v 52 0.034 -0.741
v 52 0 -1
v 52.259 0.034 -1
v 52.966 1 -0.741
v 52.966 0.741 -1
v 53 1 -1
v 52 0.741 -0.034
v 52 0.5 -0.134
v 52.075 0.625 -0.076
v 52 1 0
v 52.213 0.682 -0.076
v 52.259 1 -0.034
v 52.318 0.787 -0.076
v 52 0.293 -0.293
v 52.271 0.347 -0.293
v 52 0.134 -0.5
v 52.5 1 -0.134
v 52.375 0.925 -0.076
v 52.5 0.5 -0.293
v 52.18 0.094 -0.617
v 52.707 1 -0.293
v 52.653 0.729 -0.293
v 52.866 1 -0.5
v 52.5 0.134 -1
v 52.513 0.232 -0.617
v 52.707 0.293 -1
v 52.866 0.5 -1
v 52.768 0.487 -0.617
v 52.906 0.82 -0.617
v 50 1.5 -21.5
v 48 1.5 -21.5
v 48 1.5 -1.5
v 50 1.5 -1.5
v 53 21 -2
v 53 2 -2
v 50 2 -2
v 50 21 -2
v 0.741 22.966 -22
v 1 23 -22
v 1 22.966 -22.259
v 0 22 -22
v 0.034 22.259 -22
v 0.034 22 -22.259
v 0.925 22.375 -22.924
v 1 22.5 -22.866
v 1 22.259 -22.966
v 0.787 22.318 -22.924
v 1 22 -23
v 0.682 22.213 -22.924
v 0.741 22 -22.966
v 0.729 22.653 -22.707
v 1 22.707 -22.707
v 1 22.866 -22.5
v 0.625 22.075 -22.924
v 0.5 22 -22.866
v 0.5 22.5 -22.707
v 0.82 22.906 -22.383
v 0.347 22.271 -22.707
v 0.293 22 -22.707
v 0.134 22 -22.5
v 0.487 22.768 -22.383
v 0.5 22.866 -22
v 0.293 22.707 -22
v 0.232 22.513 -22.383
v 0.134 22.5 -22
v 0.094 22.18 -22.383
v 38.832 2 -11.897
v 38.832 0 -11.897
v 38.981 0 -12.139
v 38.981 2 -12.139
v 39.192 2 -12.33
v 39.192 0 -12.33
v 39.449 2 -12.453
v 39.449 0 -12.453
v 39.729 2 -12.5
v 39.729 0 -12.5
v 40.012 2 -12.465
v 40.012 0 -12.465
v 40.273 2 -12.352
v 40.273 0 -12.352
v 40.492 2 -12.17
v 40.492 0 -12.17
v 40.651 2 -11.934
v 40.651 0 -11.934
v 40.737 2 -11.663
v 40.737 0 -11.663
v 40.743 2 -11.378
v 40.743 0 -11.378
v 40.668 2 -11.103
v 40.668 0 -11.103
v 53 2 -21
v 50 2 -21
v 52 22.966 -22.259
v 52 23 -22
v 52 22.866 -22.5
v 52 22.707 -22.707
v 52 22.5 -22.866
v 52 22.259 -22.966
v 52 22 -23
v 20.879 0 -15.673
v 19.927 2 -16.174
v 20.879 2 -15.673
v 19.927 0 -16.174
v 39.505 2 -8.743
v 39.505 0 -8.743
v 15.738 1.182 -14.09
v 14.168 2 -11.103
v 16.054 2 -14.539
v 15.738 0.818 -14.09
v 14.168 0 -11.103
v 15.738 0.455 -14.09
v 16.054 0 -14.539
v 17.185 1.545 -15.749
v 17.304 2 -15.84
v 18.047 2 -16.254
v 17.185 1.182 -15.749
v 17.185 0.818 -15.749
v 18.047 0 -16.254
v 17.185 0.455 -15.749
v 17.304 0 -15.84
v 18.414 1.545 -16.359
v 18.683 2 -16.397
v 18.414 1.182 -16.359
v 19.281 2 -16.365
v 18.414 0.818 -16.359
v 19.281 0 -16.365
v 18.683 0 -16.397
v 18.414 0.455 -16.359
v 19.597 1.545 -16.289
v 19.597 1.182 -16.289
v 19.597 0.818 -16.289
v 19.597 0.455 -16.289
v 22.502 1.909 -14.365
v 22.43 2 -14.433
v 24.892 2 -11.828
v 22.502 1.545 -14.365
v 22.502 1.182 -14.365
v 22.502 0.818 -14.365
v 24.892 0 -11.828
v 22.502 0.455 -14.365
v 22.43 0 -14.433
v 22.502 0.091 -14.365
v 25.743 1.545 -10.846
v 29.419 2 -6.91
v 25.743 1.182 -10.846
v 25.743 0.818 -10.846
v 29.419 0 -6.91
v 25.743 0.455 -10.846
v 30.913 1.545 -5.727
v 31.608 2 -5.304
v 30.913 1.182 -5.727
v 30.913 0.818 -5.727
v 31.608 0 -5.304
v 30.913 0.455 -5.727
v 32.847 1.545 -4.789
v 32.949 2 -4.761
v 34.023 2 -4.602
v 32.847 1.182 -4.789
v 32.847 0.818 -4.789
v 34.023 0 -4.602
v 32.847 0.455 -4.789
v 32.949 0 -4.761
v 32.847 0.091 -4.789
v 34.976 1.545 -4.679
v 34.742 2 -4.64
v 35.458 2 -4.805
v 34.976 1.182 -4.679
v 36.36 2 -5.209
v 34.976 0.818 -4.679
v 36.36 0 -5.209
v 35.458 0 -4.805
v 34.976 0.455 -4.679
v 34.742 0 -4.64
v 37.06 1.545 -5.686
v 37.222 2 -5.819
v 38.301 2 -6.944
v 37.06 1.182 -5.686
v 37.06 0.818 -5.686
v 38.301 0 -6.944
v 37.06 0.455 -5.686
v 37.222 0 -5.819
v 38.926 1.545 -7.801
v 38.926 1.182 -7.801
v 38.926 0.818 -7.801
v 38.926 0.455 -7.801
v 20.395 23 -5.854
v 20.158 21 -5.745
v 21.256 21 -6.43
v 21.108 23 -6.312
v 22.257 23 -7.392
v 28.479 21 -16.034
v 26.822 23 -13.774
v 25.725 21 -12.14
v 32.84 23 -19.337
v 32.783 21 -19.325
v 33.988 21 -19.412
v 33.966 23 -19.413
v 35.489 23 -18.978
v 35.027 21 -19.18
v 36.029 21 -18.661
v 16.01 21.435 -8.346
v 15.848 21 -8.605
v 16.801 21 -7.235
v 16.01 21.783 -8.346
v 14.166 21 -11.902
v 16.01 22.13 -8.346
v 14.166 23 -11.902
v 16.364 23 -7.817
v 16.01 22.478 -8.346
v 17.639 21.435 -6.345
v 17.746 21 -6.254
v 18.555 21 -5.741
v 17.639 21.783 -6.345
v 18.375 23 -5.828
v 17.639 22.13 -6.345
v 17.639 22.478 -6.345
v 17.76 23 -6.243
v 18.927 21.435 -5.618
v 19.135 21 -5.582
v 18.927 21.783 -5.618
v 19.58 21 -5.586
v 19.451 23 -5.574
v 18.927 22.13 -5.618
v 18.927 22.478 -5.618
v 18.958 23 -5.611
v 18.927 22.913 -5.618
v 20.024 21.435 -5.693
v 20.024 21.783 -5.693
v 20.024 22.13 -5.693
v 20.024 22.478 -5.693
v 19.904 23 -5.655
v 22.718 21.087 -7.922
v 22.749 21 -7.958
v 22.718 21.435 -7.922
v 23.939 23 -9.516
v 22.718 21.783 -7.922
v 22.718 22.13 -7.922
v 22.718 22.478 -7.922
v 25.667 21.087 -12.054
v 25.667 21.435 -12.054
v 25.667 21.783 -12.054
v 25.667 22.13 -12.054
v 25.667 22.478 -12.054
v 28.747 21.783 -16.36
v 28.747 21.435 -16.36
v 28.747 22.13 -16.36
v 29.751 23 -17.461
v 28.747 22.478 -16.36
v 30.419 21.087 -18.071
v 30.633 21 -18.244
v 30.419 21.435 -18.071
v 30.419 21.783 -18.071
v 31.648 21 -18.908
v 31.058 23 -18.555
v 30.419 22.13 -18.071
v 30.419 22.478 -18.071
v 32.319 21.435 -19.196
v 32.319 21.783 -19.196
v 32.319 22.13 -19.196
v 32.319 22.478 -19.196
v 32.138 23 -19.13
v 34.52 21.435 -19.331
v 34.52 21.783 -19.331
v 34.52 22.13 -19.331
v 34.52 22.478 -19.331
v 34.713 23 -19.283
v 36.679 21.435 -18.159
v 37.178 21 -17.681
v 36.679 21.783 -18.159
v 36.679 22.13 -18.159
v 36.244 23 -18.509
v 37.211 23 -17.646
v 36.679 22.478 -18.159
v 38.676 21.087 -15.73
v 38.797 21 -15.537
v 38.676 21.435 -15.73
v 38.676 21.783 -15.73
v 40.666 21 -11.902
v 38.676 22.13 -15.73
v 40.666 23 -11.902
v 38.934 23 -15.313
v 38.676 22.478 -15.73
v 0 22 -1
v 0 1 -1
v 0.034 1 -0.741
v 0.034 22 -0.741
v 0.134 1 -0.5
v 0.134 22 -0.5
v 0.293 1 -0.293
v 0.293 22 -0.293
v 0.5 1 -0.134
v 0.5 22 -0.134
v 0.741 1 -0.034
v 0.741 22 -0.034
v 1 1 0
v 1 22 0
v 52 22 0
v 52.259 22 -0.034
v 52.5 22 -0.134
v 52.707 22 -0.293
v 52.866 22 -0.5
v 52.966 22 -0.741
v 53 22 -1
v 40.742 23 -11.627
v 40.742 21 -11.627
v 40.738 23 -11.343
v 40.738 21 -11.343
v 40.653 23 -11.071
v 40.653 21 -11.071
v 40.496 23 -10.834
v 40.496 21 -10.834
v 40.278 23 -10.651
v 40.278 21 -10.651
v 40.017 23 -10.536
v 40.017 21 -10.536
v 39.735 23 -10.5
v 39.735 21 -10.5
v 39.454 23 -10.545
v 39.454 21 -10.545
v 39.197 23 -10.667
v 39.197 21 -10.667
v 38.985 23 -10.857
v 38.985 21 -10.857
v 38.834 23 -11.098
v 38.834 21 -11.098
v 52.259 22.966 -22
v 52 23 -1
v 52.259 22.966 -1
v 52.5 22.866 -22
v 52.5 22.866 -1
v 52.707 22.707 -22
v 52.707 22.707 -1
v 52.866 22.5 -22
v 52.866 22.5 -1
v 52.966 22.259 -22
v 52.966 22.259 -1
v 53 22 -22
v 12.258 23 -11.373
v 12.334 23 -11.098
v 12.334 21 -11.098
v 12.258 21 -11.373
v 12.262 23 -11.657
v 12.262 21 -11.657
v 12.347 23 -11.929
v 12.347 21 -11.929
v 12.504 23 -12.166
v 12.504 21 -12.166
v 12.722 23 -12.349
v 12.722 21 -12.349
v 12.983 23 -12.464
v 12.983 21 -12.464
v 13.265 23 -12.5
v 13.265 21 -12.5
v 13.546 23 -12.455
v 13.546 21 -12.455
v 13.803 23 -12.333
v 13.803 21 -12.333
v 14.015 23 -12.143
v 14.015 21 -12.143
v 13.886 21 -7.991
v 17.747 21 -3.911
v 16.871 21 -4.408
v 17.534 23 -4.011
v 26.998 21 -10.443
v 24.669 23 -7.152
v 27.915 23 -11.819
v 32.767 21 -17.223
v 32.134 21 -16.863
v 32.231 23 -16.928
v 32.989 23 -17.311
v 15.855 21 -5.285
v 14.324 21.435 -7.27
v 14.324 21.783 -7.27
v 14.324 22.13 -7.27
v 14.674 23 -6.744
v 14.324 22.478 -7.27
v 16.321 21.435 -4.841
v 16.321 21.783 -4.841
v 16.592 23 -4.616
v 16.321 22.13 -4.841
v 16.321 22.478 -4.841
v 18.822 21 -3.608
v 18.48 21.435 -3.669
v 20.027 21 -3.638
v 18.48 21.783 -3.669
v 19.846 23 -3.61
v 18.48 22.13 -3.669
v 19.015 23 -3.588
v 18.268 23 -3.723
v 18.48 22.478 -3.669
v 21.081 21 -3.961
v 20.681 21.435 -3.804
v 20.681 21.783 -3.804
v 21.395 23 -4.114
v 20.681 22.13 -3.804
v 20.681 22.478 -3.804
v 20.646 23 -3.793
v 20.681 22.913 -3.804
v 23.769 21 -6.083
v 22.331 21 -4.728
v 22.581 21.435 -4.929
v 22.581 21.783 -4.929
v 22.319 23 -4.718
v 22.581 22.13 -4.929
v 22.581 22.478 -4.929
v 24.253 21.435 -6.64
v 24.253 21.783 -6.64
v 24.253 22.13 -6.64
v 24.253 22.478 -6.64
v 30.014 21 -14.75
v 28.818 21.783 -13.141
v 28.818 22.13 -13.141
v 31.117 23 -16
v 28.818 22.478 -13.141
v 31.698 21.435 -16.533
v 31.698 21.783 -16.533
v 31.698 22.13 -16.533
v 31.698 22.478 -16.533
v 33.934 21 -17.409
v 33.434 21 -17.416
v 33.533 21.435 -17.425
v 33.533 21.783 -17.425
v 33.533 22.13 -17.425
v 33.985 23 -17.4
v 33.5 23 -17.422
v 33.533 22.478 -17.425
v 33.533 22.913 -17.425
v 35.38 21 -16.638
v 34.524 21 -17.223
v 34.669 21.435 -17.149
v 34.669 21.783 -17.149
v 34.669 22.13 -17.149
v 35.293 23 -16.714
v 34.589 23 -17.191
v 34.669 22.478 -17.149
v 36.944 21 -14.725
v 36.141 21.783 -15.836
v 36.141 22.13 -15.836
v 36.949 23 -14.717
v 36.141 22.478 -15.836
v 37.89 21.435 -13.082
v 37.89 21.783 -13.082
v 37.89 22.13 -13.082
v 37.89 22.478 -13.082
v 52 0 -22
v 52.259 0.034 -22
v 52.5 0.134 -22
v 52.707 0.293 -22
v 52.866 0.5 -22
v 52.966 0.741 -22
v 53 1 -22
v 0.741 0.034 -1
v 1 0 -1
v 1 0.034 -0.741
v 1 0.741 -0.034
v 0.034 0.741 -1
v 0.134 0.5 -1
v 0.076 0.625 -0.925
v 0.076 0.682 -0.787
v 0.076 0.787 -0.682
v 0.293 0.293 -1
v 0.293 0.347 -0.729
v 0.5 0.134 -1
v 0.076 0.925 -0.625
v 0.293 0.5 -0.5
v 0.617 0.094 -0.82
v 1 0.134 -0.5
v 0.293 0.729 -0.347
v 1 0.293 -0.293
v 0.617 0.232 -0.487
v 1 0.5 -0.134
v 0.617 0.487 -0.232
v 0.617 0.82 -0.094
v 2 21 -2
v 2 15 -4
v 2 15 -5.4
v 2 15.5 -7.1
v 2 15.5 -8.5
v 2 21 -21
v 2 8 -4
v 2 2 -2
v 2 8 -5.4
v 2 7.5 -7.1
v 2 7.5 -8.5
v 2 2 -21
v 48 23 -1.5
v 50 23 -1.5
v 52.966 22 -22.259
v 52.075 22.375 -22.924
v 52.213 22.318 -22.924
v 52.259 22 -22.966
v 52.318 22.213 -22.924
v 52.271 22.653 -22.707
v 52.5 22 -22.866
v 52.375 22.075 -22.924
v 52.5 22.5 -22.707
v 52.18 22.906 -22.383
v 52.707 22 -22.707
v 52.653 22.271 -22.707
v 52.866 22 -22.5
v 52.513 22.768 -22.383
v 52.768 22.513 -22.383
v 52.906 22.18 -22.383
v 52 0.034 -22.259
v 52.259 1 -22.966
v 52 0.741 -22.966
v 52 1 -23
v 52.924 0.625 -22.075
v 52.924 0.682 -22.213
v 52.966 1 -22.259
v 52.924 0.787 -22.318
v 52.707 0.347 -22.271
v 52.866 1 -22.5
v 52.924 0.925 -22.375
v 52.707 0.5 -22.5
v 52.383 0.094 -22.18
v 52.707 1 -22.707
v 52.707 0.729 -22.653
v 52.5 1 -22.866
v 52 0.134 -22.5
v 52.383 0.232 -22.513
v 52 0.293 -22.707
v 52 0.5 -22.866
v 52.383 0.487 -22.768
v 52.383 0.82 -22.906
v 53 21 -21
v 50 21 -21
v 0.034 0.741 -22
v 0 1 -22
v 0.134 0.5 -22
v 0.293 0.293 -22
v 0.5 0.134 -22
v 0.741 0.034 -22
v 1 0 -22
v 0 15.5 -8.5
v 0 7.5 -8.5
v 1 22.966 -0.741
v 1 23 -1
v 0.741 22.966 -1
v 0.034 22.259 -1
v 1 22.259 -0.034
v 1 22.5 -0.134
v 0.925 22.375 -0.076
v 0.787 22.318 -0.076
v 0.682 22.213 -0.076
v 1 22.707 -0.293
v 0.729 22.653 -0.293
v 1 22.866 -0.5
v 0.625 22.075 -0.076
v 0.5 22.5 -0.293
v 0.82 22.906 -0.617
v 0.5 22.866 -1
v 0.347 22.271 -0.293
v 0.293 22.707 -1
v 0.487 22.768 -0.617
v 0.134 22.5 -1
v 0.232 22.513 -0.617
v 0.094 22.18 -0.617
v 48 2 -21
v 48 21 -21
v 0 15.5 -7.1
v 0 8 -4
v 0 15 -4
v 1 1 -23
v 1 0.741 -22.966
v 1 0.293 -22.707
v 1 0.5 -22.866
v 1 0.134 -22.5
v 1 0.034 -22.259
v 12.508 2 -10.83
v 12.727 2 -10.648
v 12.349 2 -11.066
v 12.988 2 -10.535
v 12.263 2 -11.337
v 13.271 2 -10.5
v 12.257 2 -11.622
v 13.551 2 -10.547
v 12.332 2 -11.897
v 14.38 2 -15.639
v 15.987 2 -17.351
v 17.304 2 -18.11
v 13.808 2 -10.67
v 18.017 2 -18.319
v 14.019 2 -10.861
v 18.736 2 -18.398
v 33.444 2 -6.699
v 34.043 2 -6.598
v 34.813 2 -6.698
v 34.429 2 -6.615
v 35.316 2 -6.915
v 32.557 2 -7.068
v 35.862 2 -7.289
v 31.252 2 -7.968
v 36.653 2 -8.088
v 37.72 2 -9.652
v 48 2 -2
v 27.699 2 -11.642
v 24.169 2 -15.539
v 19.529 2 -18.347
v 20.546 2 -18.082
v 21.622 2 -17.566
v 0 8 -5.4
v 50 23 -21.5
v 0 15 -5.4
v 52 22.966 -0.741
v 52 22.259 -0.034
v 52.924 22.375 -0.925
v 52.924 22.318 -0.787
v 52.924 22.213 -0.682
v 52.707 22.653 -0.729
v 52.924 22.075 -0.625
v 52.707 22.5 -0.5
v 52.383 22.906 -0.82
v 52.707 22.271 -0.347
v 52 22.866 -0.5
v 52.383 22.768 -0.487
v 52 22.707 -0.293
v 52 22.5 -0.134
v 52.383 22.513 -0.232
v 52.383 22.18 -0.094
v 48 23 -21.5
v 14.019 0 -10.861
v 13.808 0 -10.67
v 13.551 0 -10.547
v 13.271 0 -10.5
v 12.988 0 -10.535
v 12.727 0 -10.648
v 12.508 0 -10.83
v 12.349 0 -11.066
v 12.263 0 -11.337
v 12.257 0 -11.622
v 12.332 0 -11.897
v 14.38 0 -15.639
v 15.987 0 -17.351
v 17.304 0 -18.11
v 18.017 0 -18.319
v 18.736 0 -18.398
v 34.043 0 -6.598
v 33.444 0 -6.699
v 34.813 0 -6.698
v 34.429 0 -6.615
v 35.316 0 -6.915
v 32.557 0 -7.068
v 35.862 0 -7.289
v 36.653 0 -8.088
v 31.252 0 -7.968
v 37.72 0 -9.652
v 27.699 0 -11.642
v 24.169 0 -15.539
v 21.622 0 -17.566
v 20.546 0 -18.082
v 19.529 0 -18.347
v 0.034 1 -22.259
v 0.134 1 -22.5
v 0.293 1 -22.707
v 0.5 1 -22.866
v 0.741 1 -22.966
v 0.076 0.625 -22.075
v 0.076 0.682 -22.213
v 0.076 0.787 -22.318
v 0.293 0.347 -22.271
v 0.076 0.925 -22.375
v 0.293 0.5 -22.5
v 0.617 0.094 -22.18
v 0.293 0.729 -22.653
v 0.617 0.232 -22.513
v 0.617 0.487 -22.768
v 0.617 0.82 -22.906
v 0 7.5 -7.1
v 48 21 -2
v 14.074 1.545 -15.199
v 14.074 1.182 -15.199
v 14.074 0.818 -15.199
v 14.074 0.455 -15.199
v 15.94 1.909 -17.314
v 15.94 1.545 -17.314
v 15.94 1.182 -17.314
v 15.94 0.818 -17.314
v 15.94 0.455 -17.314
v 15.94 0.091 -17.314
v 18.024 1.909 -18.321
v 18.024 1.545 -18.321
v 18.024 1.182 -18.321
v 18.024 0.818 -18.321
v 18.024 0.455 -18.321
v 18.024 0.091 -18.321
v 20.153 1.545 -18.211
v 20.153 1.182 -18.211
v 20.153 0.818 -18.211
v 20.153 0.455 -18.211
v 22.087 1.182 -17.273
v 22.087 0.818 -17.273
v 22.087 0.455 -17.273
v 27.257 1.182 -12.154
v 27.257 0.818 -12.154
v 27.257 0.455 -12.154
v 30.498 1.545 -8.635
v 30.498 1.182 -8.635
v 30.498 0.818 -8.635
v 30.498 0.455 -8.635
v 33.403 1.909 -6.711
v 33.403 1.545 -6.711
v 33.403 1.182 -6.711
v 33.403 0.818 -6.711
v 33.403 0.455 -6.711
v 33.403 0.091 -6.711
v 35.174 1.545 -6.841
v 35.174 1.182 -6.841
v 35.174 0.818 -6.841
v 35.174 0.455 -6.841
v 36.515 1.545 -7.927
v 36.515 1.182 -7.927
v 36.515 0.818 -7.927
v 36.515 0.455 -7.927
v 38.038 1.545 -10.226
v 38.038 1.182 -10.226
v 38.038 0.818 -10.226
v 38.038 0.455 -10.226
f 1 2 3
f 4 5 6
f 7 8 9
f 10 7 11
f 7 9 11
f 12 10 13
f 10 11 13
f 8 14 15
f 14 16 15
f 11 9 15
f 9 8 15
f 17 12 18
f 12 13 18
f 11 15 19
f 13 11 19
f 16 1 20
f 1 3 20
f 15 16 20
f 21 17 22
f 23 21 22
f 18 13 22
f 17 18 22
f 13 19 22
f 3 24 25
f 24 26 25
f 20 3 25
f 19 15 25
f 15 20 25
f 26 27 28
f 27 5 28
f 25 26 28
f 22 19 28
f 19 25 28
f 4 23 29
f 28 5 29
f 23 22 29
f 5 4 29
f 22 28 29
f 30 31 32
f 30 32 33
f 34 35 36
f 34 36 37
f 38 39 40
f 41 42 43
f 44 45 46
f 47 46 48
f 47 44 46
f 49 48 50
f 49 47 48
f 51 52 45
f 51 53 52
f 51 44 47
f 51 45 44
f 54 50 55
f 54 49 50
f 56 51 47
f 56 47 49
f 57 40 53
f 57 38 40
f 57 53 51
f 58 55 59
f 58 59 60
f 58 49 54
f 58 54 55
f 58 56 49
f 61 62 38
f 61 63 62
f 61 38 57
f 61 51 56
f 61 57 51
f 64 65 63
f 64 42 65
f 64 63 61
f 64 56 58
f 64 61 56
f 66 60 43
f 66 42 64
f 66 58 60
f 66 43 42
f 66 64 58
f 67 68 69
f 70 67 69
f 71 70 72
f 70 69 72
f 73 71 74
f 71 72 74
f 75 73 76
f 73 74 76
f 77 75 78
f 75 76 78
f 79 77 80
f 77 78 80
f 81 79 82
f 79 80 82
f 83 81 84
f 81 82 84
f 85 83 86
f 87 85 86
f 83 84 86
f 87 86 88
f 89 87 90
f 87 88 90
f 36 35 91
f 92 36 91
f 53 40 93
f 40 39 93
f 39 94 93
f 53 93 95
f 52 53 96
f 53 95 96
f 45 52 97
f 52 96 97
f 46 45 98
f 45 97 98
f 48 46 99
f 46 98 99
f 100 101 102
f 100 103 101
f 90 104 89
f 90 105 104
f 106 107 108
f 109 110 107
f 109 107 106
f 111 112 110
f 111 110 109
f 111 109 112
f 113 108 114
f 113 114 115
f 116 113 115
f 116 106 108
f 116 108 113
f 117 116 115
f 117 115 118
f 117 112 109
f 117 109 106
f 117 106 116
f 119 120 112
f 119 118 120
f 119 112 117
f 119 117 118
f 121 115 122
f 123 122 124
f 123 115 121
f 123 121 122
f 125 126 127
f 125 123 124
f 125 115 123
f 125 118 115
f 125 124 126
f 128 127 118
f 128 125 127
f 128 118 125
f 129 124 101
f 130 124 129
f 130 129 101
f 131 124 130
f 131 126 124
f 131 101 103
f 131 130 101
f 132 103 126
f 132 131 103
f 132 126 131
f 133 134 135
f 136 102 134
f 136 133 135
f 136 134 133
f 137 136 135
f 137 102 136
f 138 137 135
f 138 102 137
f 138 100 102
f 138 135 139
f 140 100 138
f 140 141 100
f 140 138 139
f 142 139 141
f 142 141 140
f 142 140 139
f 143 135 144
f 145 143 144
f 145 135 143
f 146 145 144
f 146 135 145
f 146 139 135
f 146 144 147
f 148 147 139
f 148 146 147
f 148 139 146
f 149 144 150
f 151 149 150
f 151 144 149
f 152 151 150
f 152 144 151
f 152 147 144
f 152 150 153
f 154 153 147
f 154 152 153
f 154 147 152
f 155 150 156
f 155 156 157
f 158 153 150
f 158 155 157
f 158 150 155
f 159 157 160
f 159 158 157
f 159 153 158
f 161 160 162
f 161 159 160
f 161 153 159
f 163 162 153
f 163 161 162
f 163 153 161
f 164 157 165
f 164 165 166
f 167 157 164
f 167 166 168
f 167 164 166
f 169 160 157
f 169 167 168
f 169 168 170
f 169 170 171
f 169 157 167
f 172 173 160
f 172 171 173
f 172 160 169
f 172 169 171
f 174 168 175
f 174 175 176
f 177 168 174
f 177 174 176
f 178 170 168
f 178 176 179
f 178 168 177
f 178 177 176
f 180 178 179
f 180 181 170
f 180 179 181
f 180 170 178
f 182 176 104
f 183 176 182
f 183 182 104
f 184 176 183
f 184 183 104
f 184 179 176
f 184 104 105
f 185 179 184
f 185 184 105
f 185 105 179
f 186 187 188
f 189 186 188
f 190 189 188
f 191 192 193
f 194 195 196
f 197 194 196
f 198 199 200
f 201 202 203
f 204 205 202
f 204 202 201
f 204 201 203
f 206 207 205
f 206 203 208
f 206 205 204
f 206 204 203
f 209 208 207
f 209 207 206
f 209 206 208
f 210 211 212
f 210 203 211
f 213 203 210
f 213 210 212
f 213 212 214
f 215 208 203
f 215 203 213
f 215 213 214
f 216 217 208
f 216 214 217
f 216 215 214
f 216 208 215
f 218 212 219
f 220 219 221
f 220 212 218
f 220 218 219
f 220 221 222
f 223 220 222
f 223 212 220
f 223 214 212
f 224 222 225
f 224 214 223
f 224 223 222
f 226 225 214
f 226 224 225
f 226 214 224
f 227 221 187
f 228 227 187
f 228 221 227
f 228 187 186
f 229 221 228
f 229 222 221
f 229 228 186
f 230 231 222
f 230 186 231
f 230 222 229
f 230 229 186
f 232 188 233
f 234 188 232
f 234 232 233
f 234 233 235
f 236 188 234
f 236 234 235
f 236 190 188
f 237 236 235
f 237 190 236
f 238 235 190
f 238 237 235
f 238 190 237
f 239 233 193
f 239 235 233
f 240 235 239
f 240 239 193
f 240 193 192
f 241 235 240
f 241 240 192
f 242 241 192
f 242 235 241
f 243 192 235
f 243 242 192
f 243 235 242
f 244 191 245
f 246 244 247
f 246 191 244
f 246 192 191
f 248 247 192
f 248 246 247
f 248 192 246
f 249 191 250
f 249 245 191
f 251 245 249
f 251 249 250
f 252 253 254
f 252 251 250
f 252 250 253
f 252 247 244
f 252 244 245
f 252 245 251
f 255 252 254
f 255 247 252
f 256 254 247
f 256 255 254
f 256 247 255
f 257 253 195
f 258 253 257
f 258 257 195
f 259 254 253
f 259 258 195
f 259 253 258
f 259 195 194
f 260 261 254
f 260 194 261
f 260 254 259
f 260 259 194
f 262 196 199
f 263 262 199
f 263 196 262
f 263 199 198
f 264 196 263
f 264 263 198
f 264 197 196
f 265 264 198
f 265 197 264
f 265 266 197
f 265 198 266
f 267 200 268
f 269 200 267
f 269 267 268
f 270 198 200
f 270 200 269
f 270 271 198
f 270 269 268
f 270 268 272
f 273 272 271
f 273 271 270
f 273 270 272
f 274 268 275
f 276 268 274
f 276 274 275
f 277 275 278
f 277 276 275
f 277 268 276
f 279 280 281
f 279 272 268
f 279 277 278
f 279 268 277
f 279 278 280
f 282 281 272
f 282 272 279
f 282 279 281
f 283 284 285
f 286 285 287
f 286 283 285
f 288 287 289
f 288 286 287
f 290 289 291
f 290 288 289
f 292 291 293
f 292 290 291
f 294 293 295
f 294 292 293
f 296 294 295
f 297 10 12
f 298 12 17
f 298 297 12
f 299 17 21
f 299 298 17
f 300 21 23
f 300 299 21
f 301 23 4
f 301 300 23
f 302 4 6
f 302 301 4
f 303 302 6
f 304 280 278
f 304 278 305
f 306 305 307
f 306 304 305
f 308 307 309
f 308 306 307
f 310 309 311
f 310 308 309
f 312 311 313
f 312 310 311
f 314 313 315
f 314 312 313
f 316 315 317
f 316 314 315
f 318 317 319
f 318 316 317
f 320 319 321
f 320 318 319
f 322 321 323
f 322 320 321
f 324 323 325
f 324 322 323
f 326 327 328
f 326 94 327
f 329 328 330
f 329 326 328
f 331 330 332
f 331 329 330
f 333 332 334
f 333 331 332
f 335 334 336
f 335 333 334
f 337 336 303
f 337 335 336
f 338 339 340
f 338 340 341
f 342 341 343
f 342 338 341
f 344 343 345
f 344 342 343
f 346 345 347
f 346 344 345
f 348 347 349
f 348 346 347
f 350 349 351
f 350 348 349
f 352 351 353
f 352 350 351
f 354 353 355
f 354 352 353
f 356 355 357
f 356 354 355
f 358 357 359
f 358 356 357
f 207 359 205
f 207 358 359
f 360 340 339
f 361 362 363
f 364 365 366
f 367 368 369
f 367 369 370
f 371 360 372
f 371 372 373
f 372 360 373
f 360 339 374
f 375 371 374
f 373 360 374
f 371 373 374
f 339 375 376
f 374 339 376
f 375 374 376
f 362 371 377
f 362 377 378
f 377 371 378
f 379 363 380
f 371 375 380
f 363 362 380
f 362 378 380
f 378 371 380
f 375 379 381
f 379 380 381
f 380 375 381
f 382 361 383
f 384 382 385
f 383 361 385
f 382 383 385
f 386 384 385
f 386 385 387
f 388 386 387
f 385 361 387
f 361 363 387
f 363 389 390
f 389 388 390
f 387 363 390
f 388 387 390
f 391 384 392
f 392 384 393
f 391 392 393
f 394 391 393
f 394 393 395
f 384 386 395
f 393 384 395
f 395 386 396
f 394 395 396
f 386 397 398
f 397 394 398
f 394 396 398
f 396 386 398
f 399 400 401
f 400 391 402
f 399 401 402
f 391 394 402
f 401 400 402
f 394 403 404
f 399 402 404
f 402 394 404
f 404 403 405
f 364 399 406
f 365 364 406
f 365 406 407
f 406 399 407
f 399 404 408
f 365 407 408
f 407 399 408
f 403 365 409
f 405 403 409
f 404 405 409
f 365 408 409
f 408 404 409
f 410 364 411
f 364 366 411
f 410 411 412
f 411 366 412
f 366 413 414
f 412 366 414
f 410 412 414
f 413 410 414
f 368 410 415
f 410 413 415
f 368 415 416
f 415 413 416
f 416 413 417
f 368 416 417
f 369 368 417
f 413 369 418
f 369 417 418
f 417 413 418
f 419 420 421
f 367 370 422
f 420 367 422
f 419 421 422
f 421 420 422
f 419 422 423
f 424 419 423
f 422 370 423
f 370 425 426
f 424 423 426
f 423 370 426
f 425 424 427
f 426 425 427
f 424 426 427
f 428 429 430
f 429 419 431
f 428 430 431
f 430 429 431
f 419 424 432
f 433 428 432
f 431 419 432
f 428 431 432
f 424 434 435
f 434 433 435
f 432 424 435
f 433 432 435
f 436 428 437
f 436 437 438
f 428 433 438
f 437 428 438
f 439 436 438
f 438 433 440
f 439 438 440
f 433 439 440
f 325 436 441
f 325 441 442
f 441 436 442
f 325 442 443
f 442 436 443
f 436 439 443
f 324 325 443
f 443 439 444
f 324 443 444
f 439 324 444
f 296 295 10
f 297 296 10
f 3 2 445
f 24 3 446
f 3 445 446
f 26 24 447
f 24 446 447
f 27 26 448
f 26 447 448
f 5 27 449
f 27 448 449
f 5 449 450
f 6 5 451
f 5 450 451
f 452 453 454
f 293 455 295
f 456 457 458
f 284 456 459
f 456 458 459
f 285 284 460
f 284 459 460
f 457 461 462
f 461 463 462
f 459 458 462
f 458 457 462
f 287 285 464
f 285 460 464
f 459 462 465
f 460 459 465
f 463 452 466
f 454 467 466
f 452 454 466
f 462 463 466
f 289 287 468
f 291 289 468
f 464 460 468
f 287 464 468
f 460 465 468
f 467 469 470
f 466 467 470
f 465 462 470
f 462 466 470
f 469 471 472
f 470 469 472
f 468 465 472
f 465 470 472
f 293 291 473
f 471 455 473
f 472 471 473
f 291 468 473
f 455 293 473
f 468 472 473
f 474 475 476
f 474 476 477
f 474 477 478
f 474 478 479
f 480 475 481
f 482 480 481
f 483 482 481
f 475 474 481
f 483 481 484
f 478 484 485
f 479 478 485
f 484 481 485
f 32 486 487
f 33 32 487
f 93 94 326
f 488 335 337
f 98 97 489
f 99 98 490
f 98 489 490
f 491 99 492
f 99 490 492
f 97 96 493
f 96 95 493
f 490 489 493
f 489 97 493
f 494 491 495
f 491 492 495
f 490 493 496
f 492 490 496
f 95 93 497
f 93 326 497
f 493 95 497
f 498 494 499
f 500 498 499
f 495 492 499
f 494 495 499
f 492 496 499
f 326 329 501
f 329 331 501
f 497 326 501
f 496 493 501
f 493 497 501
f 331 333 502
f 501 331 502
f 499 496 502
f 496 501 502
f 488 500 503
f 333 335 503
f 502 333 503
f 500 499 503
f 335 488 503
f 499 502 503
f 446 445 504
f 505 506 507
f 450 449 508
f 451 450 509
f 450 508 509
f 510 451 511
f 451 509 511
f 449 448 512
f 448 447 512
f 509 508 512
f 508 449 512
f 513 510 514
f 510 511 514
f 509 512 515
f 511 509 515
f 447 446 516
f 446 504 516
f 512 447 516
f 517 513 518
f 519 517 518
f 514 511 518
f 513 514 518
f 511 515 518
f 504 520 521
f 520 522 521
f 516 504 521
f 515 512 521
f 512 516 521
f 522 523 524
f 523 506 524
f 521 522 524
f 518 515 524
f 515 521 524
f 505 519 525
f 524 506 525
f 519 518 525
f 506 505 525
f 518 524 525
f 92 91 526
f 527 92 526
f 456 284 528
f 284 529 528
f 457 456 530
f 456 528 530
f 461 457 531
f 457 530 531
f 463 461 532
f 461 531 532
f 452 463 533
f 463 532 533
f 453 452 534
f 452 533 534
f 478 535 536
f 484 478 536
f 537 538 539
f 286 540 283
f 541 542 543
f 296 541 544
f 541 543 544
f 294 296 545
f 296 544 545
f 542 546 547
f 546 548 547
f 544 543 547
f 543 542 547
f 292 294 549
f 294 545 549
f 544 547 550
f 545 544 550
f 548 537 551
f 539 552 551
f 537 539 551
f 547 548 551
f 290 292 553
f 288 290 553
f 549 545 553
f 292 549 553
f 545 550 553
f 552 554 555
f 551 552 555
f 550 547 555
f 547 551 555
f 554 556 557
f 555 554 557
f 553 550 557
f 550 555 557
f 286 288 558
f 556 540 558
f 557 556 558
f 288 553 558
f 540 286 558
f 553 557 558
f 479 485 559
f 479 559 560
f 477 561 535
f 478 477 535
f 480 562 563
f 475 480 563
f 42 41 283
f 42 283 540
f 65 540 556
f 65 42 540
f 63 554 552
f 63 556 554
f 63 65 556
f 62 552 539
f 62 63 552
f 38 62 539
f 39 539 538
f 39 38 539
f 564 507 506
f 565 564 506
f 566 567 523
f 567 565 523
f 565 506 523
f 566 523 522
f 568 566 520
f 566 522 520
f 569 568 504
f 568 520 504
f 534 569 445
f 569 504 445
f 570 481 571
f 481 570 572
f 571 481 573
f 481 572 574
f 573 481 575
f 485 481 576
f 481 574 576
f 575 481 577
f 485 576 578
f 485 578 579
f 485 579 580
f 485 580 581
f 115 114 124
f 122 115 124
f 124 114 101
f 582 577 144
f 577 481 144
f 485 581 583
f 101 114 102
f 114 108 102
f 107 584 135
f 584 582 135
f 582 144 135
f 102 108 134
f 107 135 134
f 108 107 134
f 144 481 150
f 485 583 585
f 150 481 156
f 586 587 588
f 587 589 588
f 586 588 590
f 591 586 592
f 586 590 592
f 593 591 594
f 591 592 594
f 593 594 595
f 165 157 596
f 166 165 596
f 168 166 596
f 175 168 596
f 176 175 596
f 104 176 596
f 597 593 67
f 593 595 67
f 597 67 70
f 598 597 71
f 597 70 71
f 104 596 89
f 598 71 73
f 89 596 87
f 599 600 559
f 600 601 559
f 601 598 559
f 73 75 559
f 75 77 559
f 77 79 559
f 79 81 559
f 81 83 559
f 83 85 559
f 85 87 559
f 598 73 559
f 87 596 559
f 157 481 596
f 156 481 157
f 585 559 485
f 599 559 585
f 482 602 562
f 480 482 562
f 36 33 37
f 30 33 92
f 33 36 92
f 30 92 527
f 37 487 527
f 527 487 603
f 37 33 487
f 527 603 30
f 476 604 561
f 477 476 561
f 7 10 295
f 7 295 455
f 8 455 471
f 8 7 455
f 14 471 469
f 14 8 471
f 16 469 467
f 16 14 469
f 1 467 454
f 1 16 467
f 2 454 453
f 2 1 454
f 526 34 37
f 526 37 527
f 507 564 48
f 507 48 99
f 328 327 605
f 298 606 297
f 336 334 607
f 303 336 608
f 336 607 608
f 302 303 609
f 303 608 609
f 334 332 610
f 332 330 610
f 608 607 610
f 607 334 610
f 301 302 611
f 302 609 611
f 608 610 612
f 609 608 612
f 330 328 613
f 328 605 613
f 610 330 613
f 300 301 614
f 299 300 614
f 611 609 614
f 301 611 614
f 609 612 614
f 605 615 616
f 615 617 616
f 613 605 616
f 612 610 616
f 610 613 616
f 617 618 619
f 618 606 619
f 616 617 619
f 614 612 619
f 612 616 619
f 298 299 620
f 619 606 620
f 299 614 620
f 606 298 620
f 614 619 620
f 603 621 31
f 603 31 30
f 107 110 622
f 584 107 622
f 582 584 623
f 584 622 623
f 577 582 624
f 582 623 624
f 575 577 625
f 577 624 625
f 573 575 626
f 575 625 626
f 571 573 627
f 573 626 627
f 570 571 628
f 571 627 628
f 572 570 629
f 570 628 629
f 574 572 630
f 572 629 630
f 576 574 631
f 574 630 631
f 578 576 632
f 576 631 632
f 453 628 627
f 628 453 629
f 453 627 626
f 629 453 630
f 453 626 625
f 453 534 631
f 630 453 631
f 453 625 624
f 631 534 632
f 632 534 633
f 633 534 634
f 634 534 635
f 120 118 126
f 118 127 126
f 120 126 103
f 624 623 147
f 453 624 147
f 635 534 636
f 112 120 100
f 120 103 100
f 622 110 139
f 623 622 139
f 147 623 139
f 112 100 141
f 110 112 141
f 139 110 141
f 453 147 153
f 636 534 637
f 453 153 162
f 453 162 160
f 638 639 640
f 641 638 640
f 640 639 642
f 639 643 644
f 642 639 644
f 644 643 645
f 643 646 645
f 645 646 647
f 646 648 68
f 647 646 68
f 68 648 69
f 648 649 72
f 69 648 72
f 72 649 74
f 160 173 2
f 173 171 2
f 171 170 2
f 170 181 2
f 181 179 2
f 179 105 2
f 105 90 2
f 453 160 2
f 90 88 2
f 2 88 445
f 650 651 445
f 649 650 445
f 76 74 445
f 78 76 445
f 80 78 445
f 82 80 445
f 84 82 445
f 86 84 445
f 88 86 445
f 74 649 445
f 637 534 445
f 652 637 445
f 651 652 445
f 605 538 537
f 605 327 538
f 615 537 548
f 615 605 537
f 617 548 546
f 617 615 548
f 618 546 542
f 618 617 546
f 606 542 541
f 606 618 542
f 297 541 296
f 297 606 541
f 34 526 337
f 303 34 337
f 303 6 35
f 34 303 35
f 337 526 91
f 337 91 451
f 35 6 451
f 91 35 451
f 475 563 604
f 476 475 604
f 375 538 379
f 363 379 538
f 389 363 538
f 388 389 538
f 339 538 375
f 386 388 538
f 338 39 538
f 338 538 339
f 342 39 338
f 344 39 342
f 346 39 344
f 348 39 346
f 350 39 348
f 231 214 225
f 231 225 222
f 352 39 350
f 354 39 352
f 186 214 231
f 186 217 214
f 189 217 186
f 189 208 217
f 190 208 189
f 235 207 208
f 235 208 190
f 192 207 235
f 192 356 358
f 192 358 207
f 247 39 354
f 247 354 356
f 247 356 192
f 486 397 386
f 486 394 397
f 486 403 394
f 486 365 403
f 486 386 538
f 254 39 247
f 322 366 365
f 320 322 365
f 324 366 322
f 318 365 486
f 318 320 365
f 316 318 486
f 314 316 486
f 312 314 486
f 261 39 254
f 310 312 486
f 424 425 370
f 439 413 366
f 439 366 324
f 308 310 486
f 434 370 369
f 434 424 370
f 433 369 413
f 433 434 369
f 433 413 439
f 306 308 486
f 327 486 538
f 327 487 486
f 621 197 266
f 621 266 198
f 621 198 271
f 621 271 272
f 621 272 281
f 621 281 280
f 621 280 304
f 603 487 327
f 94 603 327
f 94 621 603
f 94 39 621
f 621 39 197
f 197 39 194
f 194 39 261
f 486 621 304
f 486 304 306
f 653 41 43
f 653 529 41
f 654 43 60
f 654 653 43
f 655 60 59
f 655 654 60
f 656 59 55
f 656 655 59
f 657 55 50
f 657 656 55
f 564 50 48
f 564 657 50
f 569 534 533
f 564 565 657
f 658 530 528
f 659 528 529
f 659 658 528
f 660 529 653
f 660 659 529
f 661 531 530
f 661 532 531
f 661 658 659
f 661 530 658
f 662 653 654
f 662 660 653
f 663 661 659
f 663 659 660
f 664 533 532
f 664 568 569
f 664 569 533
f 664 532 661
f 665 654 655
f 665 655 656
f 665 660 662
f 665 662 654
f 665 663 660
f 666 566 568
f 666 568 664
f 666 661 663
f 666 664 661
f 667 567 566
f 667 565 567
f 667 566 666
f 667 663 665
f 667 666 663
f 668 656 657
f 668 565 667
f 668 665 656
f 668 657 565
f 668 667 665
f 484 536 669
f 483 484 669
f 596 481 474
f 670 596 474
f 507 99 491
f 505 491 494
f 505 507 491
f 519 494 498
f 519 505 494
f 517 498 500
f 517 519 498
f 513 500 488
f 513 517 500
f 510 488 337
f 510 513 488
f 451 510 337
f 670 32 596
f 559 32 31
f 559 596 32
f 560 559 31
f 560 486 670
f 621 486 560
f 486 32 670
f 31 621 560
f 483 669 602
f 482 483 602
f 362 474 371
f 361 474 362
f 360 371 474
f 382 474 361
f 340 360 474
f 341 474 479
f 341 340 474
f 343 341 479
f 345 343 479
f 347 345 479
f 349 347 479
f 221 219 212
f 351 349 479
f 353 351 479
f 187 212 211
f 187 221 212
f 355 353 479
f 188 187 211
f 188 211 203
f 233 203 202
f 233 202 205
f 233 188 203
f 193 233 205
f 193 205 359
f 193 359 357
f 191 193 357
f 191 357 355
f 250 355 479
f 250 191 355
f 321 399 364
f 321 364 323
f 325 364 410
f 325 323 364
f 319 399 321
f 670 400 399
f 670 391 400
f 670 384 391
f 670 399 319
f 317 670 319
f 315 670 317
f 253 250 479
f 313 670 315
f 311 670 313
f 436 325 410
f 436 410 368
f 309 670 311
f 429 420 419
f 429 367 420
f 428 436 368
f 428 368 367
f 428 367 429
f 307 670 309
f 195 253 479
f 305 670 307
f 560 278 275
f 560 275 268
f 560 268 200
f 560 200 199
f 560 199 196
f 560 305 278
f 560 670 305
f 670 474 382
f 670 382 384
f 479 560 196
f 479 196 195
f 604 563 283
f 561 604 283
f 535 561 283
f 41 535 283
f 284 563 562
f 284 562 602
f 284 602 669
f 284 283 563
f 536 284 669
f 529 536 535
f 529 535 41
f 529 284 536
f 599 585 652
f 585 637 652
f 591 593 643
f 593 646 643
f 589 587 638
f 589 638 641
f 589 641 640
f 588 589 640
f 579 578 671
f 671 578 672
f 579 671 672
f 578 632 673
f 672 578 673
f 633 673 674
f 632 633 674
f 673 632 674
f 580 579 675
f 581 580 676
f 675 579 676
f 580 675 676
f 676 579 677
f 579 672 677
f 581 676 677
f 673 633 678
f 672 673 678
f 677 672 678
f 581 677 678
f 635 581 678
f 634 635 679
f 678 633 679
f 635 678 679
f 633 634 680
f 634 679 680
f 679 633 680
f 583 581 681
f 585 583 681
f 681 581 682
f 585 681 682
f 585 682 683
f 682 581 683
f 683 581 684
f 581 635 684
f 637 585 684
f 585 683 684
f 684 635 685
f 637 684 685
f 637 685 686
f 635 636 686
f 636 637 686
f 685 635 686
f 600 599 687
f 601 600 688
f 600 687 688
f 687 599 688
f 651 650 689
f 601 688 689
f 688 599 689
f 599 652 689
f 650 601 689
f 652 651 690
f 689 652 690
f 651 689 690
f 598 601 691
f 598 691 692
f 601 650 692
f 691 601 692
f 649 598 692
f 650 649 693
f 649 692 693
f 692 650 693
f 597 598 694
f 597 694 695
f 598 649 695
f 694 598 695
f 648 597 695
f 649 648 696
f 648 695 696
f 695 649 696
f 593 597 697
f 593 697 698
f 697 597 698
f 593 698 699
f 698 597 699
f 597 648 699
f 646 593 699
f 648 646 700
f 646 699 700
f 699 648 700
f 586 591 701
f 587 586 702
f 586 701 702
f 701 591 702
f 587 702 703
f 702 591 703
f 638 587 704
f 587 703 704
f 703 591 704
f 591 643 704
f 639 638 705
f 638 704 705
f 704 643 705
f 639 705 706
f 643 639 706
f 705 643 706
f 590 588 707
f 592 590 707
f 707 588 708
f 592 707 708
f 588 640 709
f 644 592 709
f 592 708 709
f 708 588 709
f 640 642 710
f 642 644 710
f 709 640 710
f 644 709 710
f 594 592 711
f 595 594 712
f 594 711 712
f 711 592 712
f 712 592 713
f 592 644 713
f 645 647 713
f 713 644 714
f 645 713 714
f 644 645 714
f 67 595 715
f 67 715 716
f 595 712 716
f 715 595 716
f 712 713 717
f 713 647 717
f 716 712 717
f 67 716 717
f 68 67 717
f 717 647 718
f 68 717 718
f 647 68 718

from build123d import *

# Parameters (mm, degrees)
SKETCH1_W           = 53
SKETCH1_H           = 23
BOSS_EXTRUDE1_DEPTH = 2
SKETCH3_W           = 53
SKETCH3_H           = 23
SKETCH3_W_2         = 49
SKETCH3_H_2         = 19
BOSS_EXTRUDE2_DEPTH = 19
SKETCH5_W           = 53
SKETCH5_H           = 23
BOSS_EXTRUDE3_DEPTH = 2
CUT_EXTRUDE1_REACH  = 25
CUT_EXTRUDE2_REACH  = 55
CUT_EXTRUDE3_REACH  = 55
SKETCH9_W           = 19
SKETCH9_H           = 19
SKETCH10_W          = 2
SKETCH10_H          = 20
CUT_EXTRUDE4_DEPTH  = 21.5
FILLET1_R           = 1


with BuildPart() as part:
    # Sketch1 → Boss-Extrude1 (new body)
    with BuildSketch(Plane(origin=(0, 0, 0), x_dir=(1, 0, 0), z_dir=(0, 1, 0))):
        with Locations((26.5, 11.5)):
            Rectangle(SKETCH1_W, SKETCH1_H)
        with BuildLine():
            ThreePointArc((14.167979799, 11.103372859), (12.853372859, 10.582020201), (12.332020201, 11.896627141))
            add(Edge.make_bspline(
                [(12.332020201, 11.896627141), (12.469480865, 12.214775093), (12.762832878, 12.862826424), (13.335933972, 14.00565416), (14.069559606, 15.249143301), (14.976946321, 16.440651864), (16.244519266, 17.664776994), (18.013213928, 18.520696074), (20.198395592, 18.347411342), (22.11067197, 17.353298864), (24.473450461, 15.381830316), (26.713246554, 12.781426707), (28.903370071, 10.24854759), (30.508326384, 8.567330823), (32.048368225, 7.290846303), (33.447040029, 6.607713215), (34.391956609, 6.552903154), (35.163585916, 6.806063587), (35.804481551, 7.206405018), (36.50793545, 7.876095679), (37.256247569, 8.85306811), (37.906431149, 9.951709918), (38.429850366, 10.994805159), (38.704188556, 11.600765219), (38.832020201, 11.896627141)],
                knots=[0, 0, 0, 0, 0.015625, 0.03125, 0.0625, 0.09375, 0.125, 0.1875, 0.25, 0.3125, 0.375, 0.5, 0.5625, 0.625, 0.6875, 0.75, 0.8125, 0.84375, 0.875, 0.90625, 0.9375, 0.96875, 0.984375, 1, 1, 1, 1], degree=3))
            ThreePointArc((38.832020201, 11.896627141), (40.146627141, 12.417979799), (40.667979799, 11.103372859))
            add(Edge.make_bspline(
                [(14.167979799, 11.103372859), (14.295811444, 11.399234781), (14.570149634, 12.005194841), (15.093568851, 13.048290082), (15.743752431, 14.14693189), (16.49206455, 15.123904321), (17.195518449, 15.793594982), (17.836414084, 16.193936413), (18.608043391, 16.447096846), (19.552959971, 16.392286785), (20.951631775, 15.709153697), (22.491673616, 14.432669177), (24.096629929, 12.75145241), (26.286753446, 10.218573293), (28.526549539, 7.618169684), (30.88932803, 5.646701136), (32.801604408, 4.652588658), (34.986786072, 4.479303926), (36.755480734, 5.335223006), (38.023053679, 6.559348136), (38.930440394, 7.750856699), (39.664066028, 8.99434584), (40.237167122, 10.137173576), (40.530519135, 10.785224907), (40.667979799, 11.103372859)],
                knots=[0, 0, 0, 0, 0.015625, 0.03125, 0.0625, 0.09375, 0.125, 0.15625, 0.1875, 0.25, 0.3125, 0.375, 0.4375, 0.5, 0.625, 0.6875, 0.75, 0.8125, 0.875, 0.90625, 0.9375, 0.96875, 0.984375, 1, 1, 1, 1], degree=3))
        make_face(mode=Mode.SUBTRACT)
    extrude(amount=BOSS_EXTRUDE1_DEPTH)

    # Sketch3 → Boss-Extrude2 (add)
    with BuildSketch(Plane(origin=(0, 2, 0), x_dir=(1, 0, 0), z_dir=(0, 1, 0))):
        with Locations((26.5, 11.5)):
            Rectangle(SKETCH3_W, SKETCH3_H)
        with Locations((26.5, 11.5)):
            Rectangle(SKETCH3_W_2, SKETCH3_H_2, mode=Mode.SUBTRACT)
    extrude(amount=BOSS_EXTRUDE2_DEPTH)

    # Sketch5 → Boss-Extrude3 (add)
    with BuildSketch(Plane(origin=(0, 21, 0), x_dir=(1, 0, 0), z_dir=(0, 1, 0))):
        with Locations((26.5, 11.5)):
            Rectangle(SKETCH5_W, SKETCH5_H)
    extrude(amount=BOSS_EXTRUDE3_DEPTH)

    # Sketch7 → Cut-Extrude1 (cut, up to next)
    with BuildSketch(Plane(origin=(0, 23, 0), x_dir=(1, 0, 0), z_dir=(0, 1, 0)), mode=Mode.PRIVATE) as cut_extrude1_sk1:
        with BuildLine():
            ThreePointArc((12.334246428, 11.098259542), (12.848259542, 12.415753572), (14.165753572, 11.901740458))
            add(Edge.make_bspline(
                [(14.165753572, 11.901740458), (14.319569541, 11.551122241), (14.647608492, 10.832183671), (15.265371347, 9.591848537), (16.019360121, 8.279562849), (16.869534053, 7.103102818), (17.654222781, 6.289831839), (18.34890312, 5.806641268), (18.938193167, 5.587801008), (19.463132193, 5.549931301), (20.195435511, 5.70020599), (21.280226269, 6.347578401), (22.712802701, 7.841295003), (24.17836504, 9.816346352), (26.159265484, 12.791351284), (28.18067633, 15.841945555), (30.383820425, 18.160165201), (32.247719208, 19.361531089), (34.538967294, 19.56728313), (36.355209033, 18.558624621), (37.689381474, 17.159152284), (38.675063468, 15.789280734), (39.49940357, 14.351448085), (40.159389491, 13.025812725), (40.503651701, 12.271246104), (40.665753572, 11.901740458)],
                knots=[0, 0, 0, 0, 0.015625, 0.03125, 0.0625, 0.09375, 0.125, 0.15625, 0.1875, 0.21875, 0.25, 0.3125, 0.375, 0.4375, 0.5, 0.625, 0.6875, 0.75, 0.8125, 0.875, 0.90625, 0.9375, 0.96875, 0.984375, 1, 1, 1, 1], degree=3))
            ThreePointArc((40.665753572, 11.901740458), (40.151740458, 10.584246428), (38.834246428, 11.098259542))
            add(Edge.make_bspline(
                [(12.334246428, 11.098259542), (12.496348299, 10.728753896), (12.840610509, 9.974187275), (13.50059643, 8.648551915), (14.324936532, 7.210719266), (15.310618526, 5.840847716), (16.644790967, 4.441375379), (18.461032706, 3.43271687), (20.752280792, 3.638468911), (22.616179575, 4.839834799), (24.81932367, 7.158054445), (26.840734516, 10.208648716), (28.82163496, 13.183653648), (30.287197299, 15.158704997), (31.719773731, 16.652421599), (32.804564489, 17.29979401), (33.536867807, 17.450068699), (34.061806833, 17.412198992), (34.65109688, 17.193358732), (35.345777219, 16.710168161), (36.130465947, 15.896897182), (36.980639879, 14.720437151), (37.734628653, 13.408151463), (38.352391508, 12.167816329), (38.680430459, 11.448877759), (38.834246428, 11.098259542)],
                knots=[0, 0, 0, 0, 0.015625, 0.03125, 0.0625, 0.09375, 0.125, 0.1875, 0.25, 0.3125, 0.375, 0.5, 0.5625, 0.625, 0.6875, 0.75, 0.78125, 0.8125, 0.84375, 0.875, 0.90625, 0.9375, 0.96875, 0.984375, 1, 1, 1, 1], degree=3))
        make_face()
    cut_extrude1_tool1 = extrude(cut_extrude1_sk1.sketch, amount=-CUT_EXTRUDE1_REACH, mode=Mode.PRIVATE) & part.part
    add(cut_extrude1_tool1.solids().sort_by_distance((26.5, 23, -11.500446))[0], mode=Mode.SUBTRACT)

    # Sketch8 → Cut-Extrude2 (cut, up to next)
    with BuildSketch(Plane.ZY, mode=Mode.PRIVATE) as cut_extrude2_sk1:
        Polygon((-4, 8), (-4, 15), (-5.4, 15), (-7.1, 15.5), (-8.5, 15.5), (-8.5, 7.5), (-7.1, 7.5), (-5.4, 8), align=None)
    cut_extrude2_tool1 = extrude(cut_extrude2_sk1.sketch, amount=-CUT_EXTRUDE2_REACH, mode=Mode.PRIVATE) & part.part
    add(cut_extrude2_tool1.solids().sort_by_distance((0, 11.5, -6.321432))[0], mode=Mode.SUBTRACT)

    # Sketch9 → Cut-Extrude3 (cut, up to next)
    with BuildSketch(Plane(origin=(53, 0, 0), x_dir=(0, 0, -1), z_dir=(1, 0, 0)), mode=Mode.PRIVATE) as cut_extrude3_sk1:
        with Locations((11.5, 11.5)):
            Rectangle(SKETCH9_W, SKETCH9_H)
    cut_extrude3_tool1 = extrude(cut_extrude3_sk1.sketch, amount=-CUT_EXTRUDE3_REACH, mode=Mode.PRIVATE) & part.part
    add(cut_extrude3_tool1.solids().sort_by_distance((53, 11.5, -11.5))[0], mode=Mode.SUBTRACT)

    # Sketch10 → Cut-Extrude4 (cut)
    with BuildSketch(Plane(origin=(0, 23, 0), x_dir=(1, 0, 0), z_dir=(0, 1, 0))):
        with Locations((49, 11.5)):
            Rectangle(SKETCH10_W, SKETCH10_H)
    extrude(amount=-CUT_EXTRUDE4_DEPTH, mode=Mode.SUBTRACT)

    # Fillet1
    fillet1_edges = [part.edges().sort_by_distance(p)[0] for p in [
        (26.5, 0, -23),
        (53, 0, -11.5),
        (26.5, 0, 0),
        (0, 23, -11.5),
        (26.5, 23, 0),
        (53, 23, -11.5),
        (26.5, 23, -23),
        (0, 0, -11.5),
        (0, 11.5, -23),
        (53, 11.5, -23),
        (53, 11.5, 0),
        (0, 11.5, 0),
    ]]
    fillet(fillet1_edges, radius=FILLET1_R)


solid = part.part
